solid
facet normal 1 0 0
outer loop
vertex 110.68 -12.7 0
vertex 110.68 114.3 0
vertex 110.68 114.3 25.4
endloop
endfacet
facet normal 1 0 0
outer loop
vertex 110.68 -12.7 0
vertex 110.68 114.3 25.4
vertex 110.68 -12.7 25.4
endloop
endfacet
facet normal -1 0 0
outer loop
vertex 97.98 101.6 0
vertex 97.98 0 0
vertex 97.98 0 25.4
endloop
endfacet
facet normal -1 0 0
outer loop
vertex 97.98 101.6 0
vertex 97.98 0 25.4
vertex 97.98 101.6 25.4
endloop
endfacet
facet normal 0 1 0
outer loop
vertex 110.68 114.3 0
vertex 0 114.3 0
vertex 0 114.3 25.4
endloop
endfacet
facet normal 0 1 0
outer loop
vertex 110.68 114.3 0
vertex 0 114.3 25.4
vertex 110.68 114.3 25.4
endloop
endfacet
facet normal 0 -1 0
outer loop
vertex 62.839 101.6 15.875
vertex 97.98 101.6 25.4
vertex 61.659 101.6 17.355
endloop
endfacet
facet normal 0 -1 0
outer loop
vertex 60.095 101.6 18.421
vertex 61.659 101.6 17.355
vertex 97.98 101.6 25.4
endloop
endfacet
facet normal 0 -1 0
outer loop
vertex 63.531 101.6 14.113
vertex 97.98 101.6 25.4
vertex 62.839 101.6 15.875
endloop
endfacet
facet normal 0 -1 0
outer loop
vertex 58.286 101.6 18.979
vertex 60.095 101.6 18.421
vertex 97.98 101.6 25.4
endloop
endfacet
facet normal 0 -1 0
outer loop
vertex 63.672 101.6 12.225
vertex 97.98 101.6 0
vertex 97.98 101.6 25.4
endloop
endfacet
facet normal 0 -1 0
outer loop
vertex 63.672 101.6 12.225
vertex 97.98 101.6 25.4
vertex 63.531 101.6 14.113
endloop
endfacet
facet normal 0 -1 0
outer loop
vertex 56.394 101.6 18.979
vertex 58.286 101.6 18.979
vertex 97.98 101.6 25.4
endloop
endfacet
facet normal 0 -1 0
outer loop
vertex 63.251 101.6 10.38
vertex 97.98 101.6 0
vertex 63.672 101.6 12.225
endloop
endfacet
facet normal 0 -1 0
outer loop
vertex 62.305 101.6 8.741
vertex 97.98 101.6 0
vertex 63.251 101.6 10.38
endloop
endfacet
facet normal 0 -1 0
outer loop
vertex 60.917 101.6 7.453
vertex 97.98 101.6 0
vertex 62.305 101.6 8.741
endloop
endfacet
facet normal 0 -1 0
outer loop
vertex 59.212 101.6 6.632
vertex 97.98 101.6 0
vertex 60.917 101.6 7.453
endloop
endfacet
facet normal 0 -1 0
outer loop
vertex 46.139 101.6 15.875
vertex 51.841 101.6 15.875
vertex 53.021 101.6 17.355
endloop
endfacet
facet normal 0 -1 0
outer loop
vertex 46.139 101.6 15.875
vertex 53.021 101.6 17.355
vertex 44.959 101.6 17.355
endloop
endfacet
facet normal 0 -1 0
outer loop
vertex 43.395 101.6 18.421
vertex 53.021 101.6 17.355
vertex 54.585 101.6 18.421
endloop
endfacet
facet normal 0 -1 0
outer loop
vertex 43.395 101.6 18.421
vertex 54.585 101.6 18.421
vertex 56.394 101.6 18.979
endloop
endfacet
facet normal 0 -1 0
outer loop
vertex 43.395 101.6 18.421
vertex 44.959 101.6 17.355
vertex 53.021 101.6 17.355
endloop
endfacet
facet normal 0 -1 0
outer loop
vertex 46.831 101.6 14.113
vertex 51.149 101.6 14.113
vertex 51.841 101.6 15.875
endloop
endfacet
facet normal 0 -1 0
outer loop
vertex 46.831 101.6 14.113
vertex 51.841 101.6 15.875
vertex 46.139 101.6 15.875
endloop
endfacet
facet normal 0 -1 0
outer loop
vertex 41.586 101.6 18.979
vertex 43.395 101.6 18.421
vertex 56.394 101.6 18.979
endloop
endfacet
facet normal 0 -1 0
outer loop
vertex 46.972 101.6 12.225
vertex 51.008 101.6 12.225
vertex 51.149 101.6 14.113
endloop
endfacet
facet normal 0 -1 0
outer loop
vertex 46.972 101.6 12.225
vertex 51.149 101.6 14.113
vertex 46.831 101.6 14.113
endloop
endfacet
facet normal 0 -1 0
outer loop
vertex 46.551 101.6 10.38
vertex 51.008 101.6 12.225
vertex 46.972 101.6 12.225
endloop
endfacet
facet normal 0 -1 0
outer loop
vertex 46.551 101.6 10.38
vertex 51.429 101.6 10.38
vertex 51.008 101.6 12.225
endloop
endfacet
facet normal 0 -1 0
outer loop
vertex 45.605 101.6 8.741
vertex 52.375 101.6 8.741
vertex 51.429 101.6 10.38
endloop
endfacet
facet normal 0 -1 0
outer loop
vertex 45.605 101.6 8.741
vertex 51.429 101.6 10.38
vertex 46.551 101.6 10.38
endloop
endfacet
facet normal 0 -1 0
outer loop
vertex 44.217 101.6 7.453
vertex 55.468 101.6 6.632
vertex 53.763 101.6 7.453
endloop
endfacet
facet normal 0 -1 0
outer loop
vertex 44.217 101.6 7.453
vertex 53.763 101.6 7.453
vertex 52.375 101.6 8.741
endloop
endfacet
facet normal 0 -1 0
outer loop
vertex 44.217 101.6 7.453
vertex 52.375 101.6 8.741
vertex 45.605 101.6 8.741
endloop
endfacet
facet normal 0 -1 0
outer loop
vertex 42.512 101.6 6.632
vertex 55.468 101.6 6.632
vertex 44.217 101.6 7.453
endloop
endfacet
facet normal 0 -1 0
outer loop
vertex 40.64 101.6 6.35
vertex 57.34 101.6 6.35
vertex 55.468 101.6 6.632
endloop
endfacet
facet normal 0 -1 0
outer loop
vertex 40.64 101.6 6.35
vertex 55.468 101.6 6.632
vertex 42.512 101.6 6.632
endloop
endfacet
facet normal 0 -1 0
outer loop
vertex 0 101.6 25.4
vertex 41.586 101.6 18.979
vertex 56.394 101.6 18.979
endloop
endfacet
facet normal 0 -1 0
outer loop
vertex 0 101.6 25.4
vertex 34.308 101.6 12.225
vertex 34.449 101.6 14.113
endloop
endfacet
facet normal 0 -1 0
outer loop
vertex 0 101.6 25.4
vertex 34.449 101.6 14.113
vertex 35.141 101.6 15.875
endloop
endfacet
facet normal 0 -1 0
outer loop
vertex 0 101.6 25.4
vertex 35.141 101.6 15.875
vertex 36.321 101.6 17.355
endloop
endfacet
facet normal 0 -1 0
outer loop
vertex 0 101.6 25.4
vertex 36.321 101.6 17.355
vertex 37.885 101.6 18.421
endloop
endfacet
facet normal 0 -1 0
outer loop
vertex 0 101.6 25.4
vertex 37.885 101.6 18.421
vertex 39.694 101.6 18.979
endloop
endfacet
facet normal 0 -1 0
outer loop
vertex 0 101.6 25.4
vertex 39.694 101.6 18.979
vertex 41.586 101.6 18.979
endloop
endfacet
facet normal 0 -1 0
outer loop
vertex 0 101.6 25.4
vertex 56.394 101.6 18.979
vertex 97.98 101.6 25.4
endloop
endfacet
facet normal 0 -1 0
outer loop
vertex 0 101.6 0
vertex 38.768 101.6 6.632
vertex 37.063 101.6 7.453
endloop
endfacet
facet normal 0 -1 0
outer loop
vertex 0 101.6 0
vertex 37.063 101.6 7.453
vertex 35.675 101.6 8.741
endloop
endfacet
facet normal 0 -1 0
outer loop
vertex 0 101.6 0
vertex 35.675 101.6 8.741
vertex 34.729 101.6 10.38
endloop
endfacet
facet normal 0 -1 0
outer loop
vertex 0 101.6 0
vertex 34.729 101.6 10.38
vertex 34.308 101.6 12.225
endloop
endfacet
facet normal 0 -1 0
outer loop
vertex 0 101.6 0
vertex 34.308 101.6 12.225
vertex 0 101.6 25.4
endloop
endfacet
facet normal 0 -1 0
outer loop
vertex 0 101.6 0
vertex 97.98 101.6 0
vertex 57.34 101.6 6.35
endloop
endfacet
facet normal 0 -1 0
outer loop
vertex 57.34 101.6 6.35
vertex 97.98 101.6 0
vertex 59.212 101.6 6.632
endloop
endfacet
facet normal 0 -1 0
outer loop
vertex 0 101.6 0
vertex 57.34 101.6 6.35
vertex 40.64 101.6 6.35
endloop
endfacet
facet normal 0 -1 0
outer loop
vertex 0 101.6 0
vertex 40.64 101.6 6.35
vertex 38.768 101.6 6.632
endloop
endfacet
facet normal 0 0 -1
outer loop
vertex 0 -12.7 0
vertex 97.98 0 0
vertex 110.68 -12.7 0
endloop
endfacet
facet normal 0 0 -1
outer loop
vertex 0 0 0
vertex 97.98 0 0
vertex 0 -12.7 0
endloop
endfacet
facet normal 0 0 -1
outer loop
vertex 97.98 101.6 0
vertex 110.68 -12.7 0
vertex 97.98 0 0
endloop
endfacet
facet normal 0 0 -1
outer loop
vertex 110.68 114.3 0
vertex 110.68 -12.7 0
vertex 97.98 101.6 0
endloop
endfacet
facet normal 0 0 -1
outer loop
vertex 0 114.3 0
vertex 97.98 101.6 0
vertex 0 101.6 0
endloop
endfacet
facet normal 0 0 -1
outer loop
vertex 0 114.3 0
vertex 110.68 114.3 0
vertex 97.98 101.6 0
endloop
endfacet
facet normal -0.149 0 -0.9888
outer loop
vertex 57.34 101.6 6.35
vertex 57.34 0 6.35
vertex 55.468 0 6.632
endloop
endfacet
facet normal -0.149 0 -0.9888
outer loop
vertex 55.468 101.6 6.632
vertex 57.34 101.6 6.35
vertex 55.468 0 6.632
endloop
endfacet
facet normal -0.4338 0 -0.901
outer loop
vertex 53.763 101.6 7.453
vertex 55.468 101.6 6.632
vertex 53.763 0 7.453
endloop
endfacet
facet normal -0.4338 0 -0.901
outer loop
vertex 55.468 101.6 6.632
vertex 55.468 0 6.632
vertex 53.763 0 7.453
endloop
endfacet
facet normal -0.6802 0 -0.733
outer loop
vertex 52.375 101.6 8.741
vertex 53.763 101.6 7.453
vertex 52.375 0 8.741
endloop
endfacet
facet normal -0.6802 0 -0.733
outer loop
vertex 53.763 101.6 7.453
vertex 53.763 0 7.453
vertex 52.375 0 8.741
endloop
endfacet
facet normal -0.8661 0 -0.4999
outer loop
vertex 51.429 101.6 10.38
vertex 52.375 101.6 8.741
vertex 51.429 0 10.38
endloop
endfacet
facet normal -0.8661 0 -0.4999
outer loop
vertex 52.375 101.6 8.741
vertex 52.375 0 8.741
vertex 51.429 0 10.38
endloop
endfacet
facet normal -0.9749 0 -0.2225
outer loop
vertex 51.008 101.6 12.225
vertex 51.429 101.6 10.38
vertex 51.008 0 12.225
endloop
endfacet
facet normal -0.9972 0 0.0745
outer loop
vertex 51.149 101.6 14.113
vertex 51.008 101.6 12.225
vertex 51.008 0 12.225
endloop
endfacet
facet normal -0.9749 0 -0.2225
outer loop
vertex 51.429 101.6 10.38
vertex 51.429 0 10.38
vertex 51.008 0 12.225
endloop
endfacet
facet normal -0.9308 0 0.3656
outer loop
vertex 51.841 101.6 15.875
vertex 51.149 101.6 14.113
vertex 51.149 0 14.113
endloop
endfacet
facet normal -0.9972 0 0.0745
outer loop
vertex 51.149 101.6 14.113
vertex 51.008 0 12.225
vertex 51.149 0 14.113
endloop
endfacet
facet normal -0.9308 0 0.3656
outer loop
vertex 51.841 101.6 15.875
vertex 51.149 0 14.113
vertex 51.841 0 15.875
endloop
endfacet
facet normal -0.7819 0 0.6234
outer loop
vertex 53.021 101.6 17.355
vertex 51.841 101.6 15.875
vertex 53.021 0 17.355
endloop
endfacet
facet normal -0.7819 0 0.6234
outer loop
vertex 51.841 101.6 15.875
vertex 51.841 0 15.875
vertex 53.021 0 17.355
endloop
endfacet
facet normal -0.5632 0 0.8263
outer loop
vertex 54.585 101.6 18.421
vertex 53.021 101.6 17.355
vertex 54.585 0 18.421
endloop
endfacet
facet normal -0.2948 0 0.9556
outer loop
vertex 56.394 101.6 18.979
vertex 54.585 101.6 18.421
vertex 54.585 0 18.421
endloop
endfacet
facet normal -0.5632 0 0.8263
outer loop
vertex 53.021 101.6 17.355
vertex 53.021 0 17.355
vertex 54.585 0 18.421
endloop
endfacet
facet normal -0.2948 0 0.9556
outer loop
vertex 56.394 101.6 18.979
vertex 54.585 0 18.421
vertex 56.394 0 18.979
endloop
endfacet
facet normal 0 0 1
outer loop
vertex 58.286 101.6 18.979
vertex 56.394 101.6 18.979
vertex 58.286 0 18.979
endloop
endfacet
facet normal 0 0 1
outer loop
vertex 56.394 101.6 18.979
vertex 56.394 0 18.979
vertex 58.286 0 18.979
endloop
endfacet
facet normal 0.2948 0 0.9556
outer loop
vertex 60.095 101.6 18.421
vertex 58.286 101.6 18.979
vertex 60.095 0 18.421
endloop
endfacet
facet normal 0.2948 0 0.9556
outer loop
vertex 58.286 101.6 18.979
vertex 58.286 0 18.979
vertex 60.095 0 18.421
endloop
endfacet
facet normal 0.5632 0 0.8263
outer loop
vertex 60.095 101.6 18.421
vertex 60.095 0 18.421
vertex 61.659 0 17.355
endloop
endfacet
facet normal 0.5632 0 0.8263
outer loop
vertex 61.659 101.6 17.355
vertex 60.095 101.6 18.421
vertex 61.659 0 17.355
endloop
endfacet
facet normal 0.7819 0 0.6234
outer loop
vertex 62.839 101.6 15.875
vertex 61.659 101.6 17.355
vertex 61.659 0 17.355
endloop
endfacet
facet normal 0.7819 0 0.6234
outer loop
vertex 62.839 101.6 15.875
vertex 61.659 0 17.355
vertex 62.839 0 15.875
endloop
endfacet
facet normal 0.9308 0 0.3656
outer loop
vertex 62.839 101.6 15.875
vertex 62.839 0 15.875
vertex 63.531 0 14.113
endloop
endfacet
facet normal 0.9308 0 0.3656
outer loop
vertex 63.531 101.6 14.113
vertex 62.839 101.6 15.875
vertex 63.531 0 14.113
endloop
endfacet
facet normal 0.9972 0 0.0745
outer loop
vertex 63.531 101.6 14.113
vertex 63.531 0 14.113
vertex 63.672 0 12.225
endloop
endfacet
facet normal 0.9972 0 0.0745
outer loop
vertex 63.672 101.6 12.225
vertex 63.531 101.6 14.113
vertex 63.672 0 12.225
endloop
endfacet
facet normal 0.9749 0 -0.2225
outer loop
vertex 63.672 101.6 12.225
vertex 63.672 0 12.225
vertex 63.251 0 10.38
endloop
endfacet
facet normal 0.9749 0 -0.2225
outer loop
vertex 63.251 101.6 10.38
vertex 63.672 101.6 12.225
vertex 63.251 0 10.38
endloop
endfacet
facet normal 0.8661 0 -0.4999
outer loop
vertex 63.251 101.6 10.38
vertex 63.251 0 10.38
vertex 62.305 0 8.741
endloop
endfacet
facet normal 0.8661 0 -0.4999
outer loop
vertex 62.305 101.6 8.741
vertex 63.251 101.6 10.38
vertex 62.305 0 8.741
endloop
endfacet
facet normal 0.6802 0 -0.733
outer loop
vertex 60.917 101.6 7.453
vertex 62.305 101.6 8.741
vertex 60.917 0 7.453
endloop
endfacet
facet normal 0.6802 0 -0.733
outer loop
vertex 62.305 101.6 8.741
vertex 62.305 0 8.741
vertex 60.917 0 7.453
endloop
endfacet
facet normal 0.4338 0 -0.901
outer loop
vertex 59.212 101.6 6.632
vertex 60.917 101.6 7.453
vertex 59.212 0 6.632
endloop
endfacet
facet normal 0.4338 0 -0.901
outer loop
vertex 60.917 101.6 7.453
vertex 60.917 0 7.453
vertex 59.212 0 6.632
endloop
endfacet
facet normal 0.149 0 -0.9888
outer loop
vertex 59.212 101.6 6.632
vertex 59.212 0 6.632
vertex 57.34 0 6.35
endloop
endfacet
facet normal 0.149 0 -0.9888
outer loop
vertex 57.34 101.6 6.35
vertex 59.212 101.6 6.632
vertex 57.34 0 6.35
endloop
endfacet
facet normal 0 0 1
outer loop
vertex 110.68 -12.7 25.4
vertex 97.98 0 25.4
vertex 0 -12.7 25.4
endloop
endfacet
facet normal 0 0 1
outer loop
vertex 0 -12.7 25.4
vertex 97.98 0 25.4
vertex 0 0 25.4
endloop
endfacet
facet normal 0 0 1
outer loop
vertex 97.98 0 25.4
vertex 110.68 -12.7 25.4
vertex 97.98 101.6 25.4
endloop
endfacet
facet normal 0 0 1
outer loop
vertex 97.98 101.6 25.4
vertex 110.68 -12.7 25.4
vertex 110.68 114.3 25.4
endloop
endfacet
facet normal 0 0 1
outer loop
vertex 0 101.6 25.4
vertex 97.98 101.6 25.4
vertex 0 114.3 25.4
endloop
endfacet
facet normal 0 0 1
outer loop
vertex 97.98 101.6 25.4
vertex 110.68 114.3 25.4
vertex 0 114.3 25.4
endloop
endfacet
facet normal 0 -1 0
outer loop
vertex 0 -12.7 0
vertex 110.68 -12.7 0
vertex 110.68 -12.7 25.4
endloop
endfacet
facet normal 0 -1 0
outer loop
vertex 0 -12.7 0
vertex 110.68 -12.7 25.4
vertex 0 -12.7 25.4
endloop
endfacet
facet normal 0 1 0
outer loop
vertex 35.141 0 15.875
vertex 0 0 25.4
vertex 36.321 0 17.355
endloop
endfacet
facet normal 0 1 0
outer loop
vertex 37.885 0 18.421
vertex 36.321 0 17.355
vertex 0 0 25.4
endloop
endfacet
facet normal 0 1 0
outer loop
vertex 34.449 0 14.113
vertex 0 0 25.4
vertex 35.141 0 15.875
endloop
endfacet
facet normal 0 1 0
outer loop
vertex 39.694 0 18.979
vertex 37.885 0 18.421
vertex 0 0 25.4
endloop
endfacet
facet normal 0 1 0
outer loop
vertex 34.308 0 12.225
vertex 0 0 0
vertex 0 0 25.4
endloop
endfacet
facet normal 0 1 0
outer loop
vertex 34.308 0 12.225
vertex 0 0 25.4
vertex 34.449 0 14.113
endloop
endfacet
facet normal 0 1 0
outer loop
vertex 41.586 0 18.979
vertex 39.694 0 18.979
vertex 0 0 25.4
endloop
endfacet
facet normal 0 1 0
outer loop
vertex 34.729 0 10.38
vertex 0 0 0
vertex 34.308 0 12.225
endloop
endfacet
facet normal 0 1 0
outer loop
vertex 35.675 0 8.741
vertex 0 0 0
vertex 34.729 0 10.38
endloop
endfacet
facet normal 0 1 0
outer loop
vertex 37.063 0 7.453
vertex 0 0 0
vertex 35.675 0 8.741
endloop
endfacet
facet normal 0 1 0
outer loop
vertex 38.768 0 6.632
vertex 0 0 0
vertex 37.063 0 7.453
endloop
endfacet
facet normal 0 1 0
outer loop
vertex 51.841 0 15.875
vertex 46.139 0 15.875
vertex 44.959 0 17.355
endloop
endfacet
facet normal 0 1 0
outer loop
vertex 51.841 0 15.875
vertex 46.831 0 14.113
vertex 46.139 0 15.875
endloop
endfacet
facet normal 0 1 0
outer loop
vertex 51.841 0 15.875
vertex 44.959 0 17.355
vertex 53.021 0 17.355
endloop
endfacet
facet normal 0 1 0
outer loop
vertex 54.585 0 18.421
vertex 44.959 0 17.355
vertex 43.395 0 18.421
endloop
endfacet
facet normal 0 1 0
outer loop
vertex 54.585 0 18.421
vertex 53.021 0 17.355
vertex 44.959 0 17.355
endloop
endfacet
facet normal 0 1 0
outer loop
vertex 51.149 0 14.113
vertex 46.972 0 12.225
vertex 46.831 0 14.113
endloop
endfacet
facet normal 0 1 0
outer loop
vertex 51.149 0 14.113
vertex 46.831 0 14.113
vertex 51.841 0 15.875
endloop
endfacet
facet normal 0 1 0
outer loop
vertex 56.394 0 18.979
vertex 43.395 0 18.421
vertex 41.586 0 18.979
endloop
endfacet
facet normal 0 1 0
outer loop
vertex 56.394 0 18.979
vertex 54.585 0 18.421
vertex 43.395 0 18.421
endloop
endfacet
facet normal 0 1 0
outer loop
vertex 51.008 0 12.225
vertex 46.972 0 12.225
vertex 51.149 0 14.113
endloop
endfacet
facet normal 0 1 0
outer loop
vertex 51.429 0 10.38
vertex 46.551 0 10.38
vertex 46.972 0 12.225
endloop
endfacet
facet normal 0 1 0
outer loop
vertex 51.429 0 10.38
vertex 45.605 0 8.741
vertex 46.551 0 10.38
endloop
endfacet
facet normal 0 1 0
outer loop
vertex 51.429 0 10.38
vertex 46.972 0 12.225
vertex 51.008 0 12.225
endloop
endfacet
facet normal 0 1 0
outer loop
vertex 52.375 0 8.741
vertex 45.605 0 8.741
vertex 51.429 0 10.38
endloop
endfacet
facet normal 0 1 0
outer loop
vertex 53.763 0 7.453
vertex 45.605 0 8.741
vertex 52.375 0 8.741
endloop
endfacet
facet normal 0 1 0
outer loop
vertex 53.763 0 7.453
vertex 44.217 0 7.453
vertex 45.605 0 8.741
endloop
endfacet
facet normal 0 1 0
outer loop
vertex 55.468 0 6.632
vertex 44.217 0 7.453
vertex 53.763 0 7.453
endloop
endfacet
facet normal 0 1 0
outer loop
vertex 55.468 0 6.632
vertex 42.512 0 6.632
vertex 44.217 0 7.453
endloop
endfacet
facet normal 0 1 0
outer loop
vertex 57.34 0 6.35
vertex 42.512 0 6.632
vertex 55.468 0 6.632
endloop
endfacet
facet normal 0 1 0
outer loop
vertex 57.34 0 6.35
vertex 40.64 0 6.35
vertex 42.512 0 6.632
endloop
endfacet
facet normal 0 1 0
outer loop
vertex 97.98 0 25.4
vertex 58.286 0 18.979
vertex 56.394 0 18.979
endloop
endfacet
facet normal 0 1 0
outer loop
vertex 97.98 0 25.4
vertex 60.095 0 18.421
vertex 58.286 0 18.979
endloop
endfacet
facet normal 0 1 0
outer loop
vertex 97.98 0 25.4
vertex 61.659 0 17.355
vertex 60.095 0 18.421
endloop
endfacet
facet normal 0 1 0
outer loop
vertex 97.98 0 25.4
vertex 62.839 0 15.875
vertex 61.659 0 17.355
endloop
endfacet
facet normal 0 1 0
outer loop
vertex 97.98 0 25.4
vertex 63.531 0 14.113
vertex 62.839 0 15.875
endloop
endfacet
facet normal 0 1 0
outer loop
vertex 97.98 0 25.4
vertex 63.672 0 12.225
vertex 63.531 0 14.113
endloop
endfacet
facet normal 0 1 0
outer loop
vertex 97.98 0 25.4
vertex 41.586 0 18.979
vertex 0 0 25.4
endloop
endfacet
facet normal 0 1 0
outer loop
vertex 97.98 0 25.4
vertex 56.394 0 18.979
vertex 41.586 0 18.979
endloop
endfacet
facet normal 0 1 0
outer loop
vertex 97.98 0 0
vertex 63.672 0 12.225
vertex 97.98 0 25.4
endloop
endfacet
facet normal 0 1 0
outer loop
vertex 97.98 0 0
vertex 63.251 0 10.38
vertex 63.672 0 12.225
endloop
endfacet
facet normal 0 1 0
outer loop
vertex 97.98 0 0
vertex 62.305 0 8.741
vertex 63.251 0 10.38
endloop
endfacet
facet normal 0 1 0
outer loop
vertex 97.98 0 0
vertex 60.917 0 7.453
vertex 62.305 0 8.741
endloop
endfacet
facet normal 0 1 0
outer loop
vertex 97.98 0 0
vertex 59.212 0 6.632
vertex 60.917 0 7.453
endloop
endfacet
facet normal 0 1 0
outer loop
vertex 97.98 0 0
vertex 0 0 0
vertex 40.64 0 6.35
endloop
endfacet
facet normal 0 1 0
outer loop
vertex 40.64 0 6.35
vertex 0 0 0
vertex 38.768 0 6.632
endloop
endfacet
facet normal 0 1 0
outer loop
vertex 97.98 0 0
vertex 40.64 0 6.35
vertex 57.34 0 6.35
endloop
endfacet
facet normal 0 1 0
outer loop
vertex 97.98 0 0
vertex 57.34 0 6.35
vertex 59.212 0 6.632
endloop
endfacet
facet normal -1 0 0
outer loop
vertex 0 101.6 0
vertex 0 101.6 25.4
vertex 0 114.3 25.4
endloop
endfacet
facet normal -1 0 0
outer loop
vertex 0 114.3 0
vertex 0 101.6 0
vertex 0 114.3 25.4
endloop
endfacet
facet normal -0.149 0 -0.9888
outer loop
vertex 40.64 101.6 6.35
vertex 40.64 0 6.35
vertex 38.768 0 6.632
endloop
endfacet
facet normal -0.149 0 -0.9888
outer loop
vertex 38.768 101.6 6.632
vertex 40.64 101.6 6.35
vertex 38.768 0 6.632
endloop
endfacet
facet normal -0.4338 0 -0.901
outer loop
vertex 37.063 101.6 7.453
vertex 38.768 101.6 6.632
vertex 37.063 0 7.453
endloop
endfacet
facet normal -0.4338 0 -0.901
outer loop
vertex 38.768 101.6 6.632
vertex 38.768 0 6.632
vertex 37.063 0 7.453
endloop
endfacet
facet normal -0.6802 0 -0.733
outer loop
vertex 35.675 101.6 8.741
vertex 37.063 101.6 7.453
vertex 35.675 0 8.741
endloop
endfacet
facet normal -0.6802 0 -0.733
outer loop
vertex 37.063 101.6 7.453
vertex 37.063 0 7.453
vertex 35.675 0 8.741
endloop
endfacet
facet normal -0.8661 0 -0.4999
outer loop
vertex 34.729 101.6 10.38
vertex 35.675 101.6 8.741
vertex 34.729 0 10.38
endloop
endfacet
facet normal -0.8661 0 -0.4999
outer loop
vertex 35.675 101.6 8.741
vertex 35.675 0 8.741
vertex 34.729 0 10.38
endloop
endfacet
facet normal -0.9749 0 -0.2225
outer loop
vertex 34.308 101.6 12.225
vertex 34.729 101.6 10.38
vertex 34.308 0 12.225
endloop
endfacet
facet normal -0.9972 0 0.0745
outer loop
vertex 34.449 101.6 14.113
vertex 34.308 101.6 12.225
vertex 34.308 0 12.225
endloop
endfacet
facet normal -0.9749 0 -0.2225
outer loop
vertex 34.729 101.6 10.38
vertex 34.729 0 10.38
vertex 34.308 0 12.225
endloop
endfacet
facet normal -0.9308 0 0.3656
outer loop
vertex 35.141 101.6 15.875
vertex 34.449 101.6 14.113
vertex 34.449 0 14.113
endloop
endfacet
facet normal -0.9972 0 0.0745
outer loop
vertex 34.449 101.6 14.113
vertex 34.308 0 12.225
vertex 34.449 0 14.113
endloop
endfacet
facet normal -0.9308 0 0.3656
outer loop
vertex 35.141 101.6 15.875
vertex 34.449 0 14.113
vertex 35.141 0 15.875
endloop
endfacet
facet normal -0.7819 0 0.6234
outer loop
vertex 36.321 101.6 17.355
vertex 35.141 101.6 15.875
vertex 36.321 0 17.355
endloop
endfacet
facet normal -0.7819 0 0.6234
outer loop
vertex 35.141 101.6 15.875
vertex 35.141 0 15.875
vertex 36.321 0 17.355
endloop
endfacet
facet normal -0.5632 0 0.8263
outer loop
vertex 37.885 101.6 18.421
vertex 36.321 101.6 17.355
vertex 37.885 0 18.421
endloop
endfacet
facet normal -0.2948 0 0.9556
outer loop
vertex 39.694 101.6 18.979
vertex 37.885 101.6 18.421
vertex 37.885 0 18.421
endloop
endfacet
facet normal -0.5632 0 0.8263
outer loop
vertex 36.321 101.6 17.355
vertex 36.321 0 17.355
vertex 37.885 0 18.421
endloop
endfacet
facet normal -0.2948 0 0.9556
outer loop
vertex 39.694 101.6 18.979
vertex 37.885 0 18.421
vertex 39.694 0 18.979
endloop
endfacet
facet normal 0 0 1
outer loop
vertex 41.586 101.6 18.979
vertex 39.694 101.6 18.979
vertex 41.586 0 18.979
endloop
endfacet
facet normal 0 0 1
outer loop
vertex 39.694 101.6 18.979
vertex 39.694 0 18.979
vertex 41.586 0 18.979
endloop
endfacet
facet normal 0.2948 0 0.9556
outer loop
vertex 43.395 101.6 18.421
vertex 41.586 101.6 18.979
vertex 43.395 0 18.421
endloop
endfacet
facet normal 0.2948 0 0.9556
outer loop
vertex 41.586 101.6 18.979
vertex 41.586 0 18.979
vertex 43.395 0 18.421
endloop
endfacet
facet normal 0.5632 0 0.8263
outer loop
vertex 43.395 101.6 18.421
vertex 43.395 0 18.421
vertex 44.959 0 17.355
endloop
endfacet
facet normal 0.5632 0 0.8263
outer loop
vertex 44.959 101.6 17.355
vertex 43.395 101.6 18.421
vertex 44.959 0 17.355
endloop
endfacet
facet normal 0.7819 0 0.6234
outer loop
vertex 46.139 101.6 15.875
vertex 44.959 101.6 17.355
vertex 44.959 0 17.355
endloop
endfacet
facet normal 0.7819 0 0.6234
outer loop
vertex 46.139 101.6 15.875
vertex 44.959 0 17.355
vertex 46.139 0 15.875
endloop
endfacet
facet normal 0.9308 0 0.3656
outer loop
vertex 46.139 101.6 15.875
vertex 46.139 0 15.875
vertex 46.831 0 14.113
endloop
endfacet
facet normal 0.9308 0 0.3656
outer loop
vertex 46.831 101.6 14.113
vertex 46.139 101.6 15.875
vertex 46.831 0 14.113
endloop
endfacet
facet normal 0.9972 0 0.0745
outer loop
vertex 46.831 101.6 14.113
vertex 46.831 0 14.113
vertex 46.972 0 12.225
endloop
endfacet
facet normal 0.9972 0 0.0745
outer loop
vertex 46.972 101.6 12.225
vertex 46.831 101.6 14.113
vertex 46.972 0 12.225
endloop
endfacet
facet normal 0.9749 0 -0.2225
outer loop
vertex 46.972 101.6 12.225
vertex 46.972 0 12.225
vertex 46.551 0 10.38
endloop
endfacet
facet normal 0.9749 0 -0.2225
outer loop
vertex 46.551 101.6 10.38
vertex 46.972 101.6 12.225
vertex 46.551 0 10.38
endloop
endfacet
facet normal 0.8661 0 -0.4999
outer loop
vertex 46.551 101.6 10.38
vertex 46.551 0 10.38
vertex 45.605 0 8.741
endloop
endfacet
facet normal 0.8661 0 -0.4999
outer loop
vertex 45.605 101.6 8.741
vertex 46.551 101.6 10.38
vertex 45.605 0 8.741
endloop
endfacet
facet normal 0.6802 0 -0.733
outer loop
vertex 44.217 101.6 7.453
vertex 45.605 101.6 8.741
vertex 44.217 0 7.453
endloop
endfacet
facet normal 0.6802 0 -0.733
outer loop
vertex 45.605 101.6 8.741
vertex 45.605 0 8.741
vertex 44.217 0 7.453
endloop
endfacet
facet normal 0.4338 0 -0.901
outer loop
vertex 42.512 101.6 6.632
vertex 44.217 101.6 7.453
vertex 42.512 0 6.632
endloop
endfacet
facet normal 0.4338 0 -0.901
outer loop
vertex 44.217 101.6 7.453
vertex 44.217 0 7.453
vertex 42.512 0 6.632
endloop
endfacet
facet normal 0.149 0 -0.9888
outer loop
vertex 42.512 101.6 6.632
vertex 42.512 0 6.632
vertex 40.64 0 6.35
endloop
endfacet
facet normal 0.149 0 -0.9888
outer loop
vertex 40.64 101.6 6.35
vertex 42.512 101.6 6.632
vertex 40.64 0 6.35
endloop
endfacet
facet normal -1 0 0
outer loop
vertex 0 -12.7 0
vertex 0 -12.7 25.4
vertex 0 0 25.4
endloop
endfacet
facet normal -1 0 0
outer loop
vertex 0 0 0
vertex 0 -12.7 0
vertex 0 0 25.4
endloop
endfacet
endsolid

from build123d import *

# Parameters (mm, degrees)
BOSS_EXTRUDE1_DEPTH = 25.4
SKETCH2_R           = 6.35
BOSS_EXTRUDE2_DEPTH = 101.6


with BuildPart() as part:
    # Sketch1 → Boss-Extrude1 (new body)
    with BuildSketch(Plane.XY):
        Polygon((0, 0), (97.980047506, 0), (97.980047506, 101.6), (0, 101.6), (0, 114.3), (110.680047506, 114.3), (110.680047506, -12.7), (0, -12.7), align=None)
    extrude(amount=BOSS_EXTRUDE1_DEPTH)

    # Sketch2 → Boss-Extrude2 (add)
    with BuildSketch(Plane(origin=(0, 0, 0), x_dir=(1, 0, 0), z_dir=(0, 1, 0))):
        with Locations(Location((40.640027753, -12.7, 0), (0, 0, 90))):
            Circle(SKETCH2_R)
        with Locations(Location((57.340019753, -12.7, 0), (0, 0, 90))):
            Circle(SKETCH2_R)
    extrude(amount=BOSS_EXTRUDE2_DEPTH)


solid = part.part
